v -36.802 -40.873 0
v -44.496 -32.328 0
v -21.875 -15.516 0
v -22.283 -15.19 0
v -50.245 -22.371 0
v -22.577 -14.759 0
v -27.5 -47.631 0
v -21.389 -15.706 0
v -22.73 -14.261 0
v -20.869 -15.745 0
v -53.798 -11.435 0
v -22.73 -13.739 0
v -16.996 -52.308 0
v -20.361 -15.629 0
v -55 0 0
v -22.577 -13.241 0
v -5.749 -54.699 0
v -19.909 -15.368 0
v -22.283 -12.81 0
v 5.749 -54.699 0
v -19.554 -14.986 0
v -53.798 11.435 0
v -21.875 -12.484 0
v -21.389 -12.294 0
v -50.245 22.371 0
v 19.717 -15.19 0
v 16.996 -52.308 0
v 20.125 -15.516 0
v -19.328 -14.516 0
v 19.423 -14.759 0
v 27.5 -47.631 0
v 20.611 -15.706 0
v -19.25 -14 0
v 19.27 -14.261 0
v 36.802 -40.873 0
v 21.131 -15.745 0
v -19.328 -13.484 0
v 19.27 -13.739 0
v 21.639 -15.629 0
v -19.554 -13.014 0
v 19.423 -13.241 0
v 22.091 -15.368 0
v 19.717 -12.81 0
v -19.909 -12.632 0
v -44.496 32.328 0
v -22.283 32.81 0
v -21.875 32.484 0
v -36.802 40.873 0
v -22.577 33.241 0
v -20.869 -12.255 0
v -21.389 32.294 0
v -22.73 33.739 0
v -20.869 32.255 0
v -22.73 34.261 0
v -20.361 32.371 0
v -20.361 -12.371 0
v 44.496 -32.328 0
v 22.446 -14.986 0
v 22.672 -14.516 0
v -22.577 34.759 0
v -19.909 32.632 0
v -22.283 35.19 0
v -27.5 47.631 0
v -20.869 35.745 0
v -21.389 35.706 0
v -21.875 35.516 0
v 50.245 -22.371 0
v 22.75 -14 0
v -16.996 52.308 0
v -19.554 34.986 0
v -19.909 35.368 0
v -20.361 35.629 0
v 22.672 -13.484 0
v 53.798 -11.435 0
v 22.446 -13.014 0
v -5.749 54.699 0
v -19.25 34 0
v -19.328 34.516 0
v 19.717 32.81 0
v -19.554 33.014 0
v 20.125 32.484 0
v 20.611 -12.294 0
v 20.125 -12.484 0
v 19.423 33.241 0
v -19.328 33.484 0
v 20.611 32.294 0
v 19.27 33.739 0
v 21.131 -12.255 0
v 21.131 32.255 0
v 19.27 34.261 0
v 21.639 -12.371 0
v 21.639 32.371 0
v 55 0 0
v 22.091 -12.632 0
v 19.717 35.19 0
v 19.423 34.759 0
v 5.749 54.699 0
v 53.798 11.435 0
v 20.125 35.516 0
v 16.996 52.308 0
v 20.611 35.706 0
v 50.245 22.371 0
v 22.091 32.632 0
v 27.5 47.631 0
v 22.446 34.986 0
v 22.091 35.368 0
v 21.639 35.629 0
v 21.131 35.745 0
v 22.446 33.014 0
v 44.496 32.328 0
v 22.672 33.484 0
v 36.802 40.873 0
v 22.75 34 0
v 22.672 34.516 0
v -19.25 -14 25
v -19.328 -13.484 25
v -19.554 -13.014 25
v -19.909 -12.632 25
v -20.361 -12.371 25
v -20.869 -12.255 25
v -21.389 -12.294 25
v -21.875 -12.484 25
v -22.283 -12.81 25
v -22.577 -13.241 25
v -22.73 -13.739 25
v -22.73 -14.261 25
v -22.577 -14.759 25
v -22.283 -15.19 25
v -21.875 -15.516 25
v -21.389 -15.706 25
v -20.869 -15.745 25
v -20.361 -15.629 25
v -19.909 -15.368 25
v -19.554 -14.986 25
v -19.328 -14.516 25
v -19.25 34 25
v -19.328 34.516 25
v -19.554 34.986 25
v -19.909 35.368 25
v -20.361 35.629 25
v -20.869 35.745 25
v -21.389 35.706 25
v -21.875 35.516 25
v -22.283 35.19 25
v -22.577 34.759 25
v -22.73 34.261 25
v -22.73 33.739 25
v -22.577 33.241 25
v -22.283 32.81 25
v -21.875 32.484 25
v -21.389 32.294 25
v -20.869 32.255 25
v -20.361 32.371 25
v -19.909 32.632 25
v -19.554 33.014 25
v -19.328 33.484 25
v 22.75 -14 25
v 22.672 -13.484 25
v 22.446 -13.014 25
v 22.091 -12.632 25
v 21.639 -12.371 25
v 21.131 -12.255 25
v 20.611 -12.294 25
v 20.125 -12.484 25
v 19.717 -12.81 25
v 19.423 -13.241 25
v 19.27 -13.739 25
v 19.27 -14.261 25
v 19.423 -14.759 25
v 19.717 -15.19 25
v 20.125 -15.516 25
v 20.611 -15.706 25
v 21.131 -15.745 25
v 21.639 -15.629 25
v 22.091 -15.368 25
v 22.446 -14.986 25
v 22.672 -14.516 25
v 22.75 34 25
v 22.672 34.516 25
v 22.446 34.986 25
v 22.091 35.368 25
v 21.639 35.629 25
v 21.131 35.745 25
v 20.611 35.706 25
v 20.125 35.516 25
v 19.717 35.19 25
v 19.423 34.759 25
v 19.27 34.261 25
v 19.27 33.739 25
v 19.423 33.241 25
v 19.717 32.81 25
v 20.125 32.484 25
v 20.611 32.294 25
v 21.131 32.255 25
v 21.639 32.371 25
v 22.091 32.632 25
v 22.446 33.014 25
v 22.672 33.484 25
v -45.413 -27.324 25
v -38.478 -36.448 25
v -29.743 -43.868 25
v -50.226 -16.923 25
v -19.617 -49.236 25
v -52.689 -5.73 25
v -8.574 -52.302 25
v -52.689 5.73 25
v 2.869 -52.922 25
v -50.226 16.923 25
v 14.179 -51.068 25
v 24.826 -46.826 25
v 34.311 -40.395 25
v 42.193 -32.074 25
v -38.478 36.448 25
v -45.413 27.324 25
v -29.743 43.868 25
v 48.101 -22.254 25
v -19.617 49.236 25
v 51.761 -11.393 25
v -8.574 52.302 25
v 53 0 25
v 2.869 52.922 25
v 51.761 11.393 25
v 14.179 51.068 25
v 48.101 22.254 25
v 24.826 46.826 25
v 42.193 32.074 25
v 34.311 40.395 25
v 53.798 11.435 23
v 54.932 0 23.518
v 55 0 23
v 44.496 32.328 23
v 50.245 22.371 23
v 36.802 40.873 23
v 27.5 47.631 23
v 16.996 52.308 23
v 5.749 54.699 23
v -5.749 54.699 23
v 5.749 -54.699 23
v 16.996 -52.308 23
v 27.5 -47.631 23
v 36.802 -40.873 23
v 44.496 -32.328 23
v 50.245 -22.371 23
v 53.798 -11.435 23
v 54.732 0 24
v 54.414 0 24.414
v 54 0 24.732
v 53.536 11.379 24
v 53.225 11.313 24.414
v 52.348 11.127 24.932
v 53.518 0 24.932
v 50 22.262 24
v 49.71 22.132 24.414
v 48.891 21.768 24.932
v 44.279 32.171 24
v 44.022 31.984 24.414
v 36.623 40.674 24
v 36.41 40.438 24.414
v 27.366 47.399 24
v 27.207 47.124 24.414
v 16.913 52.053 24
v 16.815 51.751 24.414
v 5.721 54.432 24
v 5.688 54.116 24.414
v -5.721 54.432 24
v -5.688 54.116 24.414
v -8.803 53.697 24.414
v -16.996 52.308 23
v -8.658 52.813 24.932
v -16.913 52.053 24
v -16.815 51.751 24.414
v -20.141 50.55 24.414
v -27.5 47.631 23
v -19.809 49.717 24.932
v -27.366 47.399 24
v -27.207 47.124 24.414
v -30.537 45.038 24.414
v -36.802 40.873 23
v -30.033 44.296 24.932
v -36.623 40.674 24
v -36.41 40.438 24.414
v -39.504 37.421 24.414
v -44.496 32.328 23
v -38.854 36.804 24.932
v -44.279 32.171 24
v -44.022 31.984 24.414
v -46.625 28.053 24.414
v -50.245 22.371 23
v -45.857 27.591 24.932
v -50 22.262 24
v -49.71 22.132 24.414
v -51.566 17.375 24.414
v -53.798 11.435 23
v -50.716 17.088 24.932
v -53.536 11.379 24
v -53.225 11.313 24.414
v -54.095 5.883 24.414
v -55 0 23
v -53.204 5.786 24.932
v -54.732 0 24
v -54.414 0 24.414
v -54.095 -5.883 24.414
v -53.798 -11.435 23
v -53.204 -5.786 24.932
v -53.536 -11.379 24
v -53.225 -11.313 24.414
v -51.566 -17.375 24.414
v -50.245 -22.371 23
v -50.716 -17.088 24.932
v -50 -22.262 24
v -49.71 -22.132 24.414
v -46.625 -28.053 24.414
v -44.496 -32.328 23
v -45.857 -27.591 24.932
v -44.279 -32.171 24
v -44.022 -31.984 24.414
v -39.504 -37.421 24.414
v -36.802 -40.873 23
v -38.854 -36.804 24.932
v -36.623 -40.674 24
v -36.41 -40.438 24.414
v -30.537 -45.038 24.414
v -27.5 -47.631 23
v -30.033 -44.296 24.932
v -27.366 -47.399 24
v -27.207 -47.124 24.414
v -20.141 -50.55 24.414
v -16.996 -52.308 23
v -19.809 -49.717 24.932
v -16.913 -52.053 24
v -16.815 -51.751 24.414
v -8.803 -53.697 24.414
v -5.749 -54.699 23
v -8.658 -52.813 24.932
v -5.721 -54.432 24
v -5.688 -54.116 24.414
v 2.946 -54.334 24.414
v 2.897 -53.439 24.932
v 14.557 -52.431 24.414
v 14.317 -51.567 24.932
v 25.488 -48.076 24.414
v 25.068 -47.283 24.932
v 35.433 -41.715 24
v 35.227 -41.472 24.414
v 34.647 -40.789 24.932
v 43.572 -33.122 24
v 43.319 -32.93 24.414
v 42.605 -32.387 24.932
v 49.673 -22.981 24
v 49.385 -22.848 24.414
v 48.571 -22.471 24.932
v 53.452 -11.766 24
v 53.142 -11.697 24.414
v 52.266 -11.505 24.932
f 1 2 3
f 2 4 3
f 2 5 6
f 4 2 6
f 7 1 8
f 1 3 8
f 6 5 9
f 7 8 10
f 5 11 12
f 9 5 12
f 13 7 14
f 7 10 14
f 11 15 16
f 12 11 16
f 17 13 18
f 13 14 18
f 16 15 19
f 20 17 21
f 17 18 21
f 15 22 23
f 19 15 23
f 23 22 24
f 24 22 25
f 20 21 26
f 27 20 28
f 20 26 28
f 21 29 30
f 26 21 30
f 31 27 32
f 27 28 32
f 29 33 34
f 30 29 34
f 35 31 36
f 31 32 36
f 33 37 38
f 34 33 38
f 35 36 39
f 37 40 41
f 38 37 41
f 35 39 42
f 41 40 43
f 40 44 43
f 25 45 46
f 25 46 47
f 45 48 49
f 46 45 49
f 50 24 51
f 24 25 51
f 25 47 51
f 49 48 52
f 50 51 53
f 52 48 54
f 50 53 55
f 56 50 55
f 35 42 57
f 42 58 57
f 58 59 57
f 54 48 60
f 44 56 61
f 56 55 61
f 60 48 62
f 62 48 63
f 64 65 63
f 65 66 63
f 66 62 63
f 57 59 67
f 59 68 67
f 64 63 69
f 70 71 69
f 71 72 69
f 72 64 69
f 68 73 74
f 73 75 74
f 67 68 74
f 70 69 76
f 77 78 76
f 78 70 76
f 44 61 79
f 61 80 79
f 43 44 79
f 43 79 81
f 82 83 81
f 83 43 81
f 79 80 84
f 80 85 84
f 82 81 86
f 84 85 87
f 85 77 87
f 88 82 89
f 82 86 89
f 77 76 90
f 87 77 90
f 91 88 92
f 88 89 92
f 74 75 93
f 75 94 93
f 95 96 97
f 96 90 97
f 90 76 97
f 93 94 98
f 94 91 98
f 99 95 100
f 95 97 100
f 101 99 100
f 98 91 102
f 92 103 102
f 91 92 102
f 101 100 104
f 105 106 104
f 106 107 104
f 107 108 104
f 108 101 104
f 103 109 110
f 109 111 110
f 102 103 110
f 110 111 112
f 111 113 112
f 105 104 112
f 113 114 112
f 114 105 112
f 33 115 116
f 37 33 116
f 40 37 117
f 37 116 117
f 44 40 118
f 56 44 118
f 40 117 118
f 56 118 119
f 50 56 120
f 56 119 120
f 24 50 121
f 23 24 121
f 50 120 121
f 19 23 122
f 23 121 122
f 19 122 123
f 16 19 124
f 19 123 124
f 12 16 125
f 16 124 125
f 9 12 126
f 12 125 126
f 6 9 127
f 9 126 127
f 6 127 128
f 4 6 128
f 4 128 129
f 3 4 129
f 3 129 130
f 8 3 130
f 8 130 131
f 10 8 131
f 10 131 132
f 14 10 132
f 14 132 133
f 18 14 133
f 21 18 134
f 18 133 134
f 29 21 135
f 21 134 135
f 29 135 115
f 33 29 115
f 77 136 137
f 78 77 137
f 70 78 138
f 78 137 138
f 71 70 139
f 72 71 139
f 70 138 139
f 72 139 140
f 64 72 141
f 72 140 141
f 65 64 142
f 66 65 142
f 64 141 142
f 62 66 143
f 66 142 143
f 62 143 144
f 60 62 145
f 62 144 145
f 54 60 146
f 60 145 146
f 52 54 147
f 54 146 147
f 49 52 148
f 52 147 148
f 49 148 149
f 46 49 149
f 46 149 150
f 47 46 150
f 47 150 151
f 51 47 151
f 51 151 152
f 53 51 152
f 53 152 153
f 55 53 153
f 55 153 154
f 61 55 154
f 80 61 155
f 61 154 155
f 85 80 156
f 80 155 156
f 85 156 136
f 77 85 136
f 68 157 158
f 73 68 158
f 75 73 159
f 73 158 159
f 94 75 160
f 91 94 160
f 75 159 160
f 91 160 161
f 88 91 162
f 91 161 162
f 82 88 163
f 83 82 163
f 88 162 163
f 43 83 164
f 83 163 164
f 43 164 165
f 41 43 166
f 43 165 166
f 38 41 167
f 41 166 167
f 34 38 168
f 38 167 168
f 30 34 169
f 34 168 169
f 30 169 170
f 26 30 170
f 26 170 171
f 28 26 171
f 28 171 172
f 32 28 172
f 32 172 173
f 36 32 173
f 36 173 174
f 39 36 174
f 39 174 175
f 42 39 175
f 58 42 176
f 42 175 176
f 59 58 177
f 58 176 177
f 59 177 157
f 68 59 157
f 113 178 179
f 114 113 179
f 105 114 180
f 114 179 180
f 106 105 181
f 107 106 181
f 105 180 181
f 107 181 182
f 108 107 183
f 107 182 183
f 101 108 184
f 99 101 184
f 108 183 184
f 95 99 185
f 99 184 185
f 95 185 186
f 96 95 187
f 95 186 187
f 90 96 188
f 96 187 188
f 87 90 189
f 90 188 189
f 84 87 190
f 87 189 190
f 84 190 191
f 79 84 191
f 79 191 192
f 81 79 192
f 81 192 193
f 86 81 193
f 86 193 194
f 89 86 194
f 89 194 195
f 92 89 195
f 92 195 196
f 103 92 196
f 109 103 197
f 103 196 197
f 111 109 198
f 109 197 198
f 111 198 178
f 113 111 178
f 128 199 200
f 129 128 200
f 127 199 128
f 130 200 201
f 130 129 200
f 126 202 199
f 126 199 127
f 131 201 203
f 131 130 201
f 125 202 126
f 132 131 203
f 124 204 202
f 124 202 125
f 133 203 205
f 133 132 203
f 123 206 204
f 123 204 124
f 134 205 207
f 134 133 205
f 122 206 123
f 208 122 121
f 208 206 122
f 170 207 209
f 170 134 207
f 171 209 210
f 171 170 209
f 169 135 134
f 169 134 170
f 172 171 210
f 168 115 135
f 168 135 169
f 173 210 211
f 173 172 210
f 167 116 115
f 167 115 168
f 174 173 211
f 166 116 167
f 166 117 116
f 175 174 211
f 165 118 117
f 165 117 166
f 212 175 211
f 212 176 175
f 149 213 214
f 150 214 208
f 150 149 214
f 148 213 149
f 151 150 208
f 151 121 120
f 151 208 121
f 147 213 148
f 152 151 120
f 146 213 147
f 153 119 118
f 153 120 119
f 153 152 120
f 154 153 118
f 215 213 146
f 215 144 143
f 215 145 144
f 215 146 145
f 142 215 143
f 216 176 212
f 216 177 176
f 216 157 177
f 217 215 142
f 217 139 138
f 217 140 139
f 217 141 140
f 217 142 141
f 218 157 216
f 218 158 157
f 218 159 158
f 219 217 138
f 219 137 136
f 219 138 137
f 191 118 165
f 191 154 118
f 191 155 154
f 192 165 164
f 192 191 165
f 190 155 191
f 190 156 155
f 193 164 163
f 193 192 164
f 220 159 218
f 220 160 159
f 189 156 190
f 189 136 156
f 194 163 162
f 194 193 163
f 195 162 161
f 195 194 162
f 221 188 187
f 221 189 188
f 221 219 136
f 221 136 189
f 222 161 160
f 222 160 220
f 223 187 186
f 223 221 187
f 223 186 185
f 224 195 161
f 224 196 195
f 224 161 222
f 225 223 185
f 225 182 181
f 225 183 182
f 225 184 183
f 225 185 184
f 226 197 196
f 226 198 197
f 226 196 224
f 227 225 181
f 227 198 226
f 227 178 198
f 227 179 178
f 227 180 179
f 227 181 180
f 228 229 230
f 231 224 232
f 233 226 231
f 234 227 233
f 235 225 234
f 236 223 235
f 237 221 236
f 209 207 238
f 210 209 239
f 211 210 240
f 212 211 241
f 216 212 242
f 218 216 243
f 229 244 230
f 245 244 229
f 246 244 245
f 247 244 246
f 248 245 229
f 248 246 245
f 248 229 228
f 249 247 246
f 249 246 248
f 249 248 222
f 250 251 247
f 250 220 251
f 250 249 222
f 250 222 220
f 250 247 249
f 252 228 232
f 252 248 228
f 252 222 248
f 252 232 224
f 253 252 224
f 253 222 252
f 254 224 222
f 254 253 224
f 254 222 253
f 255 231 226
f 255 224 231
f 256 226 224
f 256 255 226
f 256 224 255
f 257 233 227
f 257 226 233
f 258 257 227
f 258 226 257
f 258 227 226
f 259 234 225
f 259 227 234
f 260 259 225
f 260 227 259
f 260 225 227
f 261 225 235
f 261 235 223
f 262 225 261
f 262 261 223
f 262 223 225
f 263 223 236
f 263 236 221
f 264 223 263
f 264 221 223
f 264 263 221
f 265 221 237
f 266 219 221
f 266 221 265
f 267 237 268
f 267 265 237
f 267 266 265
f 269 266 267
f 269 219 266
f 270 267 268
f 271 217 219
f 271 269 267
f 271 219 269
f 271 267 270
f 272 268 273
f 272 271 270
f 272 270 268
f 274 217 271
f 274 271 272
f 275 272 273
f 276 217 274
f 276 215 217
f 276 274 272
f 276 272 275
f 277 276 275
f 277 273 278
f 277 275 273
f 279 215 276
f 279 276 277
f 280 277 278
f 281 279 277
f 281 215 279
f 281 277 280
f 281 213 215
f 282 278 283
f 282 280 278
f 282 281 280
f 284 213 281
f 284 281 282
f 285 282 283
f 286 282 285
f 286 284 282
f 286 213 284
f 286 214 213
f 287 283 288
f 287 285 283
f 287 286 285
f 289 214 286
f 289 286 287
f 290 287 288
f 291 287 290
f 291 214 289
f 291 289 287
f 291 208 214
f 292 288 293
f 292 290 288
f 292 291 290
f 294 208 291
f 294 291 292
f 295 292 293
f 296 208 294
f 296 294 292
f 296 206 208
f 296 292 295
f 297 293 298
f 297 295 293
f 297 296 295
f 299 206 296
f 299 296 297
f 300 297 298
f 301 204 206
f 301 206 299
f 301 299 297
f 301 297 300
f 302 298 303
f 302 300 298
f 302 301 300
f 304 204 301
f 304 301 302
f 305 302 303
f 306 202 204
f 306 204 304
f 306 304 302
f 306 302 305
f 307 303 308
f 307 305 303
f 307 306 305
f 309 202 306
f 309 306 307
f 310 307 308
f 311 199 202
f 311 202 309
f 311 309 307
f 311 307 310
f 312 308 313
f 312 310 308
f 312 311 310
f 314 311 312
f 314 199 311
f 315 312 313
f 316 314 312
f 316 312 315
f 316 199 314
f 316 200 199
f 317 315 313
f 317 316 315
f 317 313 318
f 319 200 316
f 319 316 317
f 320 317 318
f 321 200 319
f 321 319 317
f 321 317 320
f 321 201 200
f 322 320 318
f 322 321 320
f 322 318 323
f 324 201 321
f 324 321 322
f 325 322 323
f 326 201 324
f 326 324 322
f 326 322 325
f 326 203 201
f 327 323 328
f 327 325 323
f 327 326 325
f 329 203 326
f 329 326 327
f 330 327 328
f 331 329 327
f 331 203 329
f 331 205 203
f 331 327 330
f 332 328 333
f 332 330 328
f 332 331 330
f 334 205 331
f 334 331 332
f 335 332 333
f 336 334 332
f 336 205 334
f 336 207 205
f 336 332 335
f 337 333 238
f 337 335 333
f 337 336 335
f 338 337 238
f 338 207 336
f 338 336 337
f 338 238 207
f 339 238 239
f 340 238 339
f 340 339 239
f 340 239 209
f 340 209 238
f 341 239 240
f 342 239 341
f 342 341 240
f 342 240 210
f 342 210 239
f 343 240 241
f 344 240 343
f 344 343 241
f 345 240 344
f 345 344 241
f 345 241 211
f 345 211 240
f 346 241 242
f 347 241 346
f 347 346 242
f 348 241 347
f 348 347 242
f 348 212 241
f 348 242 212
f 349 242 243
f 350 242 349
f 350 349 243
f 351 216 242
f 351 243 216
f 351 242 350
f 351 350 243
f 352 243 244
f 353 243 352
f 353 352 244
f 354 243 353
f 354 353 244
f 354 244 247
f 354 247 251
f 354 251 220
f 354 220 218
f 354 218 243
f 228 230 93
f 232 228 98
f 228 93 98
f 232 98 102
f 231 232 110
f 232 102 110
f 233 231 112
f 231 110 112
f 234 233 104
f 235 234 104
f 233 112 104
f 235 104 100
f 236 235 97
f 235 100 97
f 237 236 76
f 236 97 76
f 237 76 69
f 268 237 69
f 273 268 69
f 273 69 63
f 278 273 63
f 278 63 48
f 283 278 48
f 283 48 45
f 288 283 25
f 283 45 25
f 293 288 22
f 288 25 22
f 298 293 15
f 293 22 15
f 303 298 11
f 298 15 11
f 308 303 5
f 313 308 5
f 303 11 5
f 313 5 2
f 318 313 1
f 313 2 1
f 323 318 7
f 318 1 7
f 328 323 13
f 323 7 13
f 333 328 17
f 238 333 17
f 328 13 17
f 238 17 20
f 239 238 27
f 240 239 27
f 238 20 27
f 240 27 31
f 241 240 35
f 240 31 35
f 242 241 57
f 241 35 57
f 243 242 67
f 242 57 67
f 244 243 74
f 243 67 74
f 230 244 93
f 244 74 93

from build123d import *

# Parameters (mm, degrees)
F0_R     = 55
F1_DEPTH = 25
F2_R     = 2
F3_R     = 1.75
F4_DEPTH = 25


with BuildPart() as f1:
    # F0 (on Top) → F1 (new body)
    with BuildSketch(Plane.XY):
        Circle(F0_R)
    extrude(amount=F1_DEPTH)

    # F2
    f2_edges = [f1.edges().sort_by_distance(p)[0] for p in [
        (-55, 0, 25),
    ]]
    fillet(f2_edges, radius=F2_R)

    # F3 (on face) → F4 (cut, through all)
    with BuildSketch(Plane.XY.offset(25)):
        with Locations((-21, 34)):
            Circle(F3_R)
        with Locations((21, 34)):
            Circle(F3_R)
        with Locations((21, -14)):
            Circle(F3_R)
        with Locations((-21, -14)):
            Circle(F3_R)
    extrude(amount=-F4_DEPTH, mode=Mode.SUBTRACT)


solid = f1.part
